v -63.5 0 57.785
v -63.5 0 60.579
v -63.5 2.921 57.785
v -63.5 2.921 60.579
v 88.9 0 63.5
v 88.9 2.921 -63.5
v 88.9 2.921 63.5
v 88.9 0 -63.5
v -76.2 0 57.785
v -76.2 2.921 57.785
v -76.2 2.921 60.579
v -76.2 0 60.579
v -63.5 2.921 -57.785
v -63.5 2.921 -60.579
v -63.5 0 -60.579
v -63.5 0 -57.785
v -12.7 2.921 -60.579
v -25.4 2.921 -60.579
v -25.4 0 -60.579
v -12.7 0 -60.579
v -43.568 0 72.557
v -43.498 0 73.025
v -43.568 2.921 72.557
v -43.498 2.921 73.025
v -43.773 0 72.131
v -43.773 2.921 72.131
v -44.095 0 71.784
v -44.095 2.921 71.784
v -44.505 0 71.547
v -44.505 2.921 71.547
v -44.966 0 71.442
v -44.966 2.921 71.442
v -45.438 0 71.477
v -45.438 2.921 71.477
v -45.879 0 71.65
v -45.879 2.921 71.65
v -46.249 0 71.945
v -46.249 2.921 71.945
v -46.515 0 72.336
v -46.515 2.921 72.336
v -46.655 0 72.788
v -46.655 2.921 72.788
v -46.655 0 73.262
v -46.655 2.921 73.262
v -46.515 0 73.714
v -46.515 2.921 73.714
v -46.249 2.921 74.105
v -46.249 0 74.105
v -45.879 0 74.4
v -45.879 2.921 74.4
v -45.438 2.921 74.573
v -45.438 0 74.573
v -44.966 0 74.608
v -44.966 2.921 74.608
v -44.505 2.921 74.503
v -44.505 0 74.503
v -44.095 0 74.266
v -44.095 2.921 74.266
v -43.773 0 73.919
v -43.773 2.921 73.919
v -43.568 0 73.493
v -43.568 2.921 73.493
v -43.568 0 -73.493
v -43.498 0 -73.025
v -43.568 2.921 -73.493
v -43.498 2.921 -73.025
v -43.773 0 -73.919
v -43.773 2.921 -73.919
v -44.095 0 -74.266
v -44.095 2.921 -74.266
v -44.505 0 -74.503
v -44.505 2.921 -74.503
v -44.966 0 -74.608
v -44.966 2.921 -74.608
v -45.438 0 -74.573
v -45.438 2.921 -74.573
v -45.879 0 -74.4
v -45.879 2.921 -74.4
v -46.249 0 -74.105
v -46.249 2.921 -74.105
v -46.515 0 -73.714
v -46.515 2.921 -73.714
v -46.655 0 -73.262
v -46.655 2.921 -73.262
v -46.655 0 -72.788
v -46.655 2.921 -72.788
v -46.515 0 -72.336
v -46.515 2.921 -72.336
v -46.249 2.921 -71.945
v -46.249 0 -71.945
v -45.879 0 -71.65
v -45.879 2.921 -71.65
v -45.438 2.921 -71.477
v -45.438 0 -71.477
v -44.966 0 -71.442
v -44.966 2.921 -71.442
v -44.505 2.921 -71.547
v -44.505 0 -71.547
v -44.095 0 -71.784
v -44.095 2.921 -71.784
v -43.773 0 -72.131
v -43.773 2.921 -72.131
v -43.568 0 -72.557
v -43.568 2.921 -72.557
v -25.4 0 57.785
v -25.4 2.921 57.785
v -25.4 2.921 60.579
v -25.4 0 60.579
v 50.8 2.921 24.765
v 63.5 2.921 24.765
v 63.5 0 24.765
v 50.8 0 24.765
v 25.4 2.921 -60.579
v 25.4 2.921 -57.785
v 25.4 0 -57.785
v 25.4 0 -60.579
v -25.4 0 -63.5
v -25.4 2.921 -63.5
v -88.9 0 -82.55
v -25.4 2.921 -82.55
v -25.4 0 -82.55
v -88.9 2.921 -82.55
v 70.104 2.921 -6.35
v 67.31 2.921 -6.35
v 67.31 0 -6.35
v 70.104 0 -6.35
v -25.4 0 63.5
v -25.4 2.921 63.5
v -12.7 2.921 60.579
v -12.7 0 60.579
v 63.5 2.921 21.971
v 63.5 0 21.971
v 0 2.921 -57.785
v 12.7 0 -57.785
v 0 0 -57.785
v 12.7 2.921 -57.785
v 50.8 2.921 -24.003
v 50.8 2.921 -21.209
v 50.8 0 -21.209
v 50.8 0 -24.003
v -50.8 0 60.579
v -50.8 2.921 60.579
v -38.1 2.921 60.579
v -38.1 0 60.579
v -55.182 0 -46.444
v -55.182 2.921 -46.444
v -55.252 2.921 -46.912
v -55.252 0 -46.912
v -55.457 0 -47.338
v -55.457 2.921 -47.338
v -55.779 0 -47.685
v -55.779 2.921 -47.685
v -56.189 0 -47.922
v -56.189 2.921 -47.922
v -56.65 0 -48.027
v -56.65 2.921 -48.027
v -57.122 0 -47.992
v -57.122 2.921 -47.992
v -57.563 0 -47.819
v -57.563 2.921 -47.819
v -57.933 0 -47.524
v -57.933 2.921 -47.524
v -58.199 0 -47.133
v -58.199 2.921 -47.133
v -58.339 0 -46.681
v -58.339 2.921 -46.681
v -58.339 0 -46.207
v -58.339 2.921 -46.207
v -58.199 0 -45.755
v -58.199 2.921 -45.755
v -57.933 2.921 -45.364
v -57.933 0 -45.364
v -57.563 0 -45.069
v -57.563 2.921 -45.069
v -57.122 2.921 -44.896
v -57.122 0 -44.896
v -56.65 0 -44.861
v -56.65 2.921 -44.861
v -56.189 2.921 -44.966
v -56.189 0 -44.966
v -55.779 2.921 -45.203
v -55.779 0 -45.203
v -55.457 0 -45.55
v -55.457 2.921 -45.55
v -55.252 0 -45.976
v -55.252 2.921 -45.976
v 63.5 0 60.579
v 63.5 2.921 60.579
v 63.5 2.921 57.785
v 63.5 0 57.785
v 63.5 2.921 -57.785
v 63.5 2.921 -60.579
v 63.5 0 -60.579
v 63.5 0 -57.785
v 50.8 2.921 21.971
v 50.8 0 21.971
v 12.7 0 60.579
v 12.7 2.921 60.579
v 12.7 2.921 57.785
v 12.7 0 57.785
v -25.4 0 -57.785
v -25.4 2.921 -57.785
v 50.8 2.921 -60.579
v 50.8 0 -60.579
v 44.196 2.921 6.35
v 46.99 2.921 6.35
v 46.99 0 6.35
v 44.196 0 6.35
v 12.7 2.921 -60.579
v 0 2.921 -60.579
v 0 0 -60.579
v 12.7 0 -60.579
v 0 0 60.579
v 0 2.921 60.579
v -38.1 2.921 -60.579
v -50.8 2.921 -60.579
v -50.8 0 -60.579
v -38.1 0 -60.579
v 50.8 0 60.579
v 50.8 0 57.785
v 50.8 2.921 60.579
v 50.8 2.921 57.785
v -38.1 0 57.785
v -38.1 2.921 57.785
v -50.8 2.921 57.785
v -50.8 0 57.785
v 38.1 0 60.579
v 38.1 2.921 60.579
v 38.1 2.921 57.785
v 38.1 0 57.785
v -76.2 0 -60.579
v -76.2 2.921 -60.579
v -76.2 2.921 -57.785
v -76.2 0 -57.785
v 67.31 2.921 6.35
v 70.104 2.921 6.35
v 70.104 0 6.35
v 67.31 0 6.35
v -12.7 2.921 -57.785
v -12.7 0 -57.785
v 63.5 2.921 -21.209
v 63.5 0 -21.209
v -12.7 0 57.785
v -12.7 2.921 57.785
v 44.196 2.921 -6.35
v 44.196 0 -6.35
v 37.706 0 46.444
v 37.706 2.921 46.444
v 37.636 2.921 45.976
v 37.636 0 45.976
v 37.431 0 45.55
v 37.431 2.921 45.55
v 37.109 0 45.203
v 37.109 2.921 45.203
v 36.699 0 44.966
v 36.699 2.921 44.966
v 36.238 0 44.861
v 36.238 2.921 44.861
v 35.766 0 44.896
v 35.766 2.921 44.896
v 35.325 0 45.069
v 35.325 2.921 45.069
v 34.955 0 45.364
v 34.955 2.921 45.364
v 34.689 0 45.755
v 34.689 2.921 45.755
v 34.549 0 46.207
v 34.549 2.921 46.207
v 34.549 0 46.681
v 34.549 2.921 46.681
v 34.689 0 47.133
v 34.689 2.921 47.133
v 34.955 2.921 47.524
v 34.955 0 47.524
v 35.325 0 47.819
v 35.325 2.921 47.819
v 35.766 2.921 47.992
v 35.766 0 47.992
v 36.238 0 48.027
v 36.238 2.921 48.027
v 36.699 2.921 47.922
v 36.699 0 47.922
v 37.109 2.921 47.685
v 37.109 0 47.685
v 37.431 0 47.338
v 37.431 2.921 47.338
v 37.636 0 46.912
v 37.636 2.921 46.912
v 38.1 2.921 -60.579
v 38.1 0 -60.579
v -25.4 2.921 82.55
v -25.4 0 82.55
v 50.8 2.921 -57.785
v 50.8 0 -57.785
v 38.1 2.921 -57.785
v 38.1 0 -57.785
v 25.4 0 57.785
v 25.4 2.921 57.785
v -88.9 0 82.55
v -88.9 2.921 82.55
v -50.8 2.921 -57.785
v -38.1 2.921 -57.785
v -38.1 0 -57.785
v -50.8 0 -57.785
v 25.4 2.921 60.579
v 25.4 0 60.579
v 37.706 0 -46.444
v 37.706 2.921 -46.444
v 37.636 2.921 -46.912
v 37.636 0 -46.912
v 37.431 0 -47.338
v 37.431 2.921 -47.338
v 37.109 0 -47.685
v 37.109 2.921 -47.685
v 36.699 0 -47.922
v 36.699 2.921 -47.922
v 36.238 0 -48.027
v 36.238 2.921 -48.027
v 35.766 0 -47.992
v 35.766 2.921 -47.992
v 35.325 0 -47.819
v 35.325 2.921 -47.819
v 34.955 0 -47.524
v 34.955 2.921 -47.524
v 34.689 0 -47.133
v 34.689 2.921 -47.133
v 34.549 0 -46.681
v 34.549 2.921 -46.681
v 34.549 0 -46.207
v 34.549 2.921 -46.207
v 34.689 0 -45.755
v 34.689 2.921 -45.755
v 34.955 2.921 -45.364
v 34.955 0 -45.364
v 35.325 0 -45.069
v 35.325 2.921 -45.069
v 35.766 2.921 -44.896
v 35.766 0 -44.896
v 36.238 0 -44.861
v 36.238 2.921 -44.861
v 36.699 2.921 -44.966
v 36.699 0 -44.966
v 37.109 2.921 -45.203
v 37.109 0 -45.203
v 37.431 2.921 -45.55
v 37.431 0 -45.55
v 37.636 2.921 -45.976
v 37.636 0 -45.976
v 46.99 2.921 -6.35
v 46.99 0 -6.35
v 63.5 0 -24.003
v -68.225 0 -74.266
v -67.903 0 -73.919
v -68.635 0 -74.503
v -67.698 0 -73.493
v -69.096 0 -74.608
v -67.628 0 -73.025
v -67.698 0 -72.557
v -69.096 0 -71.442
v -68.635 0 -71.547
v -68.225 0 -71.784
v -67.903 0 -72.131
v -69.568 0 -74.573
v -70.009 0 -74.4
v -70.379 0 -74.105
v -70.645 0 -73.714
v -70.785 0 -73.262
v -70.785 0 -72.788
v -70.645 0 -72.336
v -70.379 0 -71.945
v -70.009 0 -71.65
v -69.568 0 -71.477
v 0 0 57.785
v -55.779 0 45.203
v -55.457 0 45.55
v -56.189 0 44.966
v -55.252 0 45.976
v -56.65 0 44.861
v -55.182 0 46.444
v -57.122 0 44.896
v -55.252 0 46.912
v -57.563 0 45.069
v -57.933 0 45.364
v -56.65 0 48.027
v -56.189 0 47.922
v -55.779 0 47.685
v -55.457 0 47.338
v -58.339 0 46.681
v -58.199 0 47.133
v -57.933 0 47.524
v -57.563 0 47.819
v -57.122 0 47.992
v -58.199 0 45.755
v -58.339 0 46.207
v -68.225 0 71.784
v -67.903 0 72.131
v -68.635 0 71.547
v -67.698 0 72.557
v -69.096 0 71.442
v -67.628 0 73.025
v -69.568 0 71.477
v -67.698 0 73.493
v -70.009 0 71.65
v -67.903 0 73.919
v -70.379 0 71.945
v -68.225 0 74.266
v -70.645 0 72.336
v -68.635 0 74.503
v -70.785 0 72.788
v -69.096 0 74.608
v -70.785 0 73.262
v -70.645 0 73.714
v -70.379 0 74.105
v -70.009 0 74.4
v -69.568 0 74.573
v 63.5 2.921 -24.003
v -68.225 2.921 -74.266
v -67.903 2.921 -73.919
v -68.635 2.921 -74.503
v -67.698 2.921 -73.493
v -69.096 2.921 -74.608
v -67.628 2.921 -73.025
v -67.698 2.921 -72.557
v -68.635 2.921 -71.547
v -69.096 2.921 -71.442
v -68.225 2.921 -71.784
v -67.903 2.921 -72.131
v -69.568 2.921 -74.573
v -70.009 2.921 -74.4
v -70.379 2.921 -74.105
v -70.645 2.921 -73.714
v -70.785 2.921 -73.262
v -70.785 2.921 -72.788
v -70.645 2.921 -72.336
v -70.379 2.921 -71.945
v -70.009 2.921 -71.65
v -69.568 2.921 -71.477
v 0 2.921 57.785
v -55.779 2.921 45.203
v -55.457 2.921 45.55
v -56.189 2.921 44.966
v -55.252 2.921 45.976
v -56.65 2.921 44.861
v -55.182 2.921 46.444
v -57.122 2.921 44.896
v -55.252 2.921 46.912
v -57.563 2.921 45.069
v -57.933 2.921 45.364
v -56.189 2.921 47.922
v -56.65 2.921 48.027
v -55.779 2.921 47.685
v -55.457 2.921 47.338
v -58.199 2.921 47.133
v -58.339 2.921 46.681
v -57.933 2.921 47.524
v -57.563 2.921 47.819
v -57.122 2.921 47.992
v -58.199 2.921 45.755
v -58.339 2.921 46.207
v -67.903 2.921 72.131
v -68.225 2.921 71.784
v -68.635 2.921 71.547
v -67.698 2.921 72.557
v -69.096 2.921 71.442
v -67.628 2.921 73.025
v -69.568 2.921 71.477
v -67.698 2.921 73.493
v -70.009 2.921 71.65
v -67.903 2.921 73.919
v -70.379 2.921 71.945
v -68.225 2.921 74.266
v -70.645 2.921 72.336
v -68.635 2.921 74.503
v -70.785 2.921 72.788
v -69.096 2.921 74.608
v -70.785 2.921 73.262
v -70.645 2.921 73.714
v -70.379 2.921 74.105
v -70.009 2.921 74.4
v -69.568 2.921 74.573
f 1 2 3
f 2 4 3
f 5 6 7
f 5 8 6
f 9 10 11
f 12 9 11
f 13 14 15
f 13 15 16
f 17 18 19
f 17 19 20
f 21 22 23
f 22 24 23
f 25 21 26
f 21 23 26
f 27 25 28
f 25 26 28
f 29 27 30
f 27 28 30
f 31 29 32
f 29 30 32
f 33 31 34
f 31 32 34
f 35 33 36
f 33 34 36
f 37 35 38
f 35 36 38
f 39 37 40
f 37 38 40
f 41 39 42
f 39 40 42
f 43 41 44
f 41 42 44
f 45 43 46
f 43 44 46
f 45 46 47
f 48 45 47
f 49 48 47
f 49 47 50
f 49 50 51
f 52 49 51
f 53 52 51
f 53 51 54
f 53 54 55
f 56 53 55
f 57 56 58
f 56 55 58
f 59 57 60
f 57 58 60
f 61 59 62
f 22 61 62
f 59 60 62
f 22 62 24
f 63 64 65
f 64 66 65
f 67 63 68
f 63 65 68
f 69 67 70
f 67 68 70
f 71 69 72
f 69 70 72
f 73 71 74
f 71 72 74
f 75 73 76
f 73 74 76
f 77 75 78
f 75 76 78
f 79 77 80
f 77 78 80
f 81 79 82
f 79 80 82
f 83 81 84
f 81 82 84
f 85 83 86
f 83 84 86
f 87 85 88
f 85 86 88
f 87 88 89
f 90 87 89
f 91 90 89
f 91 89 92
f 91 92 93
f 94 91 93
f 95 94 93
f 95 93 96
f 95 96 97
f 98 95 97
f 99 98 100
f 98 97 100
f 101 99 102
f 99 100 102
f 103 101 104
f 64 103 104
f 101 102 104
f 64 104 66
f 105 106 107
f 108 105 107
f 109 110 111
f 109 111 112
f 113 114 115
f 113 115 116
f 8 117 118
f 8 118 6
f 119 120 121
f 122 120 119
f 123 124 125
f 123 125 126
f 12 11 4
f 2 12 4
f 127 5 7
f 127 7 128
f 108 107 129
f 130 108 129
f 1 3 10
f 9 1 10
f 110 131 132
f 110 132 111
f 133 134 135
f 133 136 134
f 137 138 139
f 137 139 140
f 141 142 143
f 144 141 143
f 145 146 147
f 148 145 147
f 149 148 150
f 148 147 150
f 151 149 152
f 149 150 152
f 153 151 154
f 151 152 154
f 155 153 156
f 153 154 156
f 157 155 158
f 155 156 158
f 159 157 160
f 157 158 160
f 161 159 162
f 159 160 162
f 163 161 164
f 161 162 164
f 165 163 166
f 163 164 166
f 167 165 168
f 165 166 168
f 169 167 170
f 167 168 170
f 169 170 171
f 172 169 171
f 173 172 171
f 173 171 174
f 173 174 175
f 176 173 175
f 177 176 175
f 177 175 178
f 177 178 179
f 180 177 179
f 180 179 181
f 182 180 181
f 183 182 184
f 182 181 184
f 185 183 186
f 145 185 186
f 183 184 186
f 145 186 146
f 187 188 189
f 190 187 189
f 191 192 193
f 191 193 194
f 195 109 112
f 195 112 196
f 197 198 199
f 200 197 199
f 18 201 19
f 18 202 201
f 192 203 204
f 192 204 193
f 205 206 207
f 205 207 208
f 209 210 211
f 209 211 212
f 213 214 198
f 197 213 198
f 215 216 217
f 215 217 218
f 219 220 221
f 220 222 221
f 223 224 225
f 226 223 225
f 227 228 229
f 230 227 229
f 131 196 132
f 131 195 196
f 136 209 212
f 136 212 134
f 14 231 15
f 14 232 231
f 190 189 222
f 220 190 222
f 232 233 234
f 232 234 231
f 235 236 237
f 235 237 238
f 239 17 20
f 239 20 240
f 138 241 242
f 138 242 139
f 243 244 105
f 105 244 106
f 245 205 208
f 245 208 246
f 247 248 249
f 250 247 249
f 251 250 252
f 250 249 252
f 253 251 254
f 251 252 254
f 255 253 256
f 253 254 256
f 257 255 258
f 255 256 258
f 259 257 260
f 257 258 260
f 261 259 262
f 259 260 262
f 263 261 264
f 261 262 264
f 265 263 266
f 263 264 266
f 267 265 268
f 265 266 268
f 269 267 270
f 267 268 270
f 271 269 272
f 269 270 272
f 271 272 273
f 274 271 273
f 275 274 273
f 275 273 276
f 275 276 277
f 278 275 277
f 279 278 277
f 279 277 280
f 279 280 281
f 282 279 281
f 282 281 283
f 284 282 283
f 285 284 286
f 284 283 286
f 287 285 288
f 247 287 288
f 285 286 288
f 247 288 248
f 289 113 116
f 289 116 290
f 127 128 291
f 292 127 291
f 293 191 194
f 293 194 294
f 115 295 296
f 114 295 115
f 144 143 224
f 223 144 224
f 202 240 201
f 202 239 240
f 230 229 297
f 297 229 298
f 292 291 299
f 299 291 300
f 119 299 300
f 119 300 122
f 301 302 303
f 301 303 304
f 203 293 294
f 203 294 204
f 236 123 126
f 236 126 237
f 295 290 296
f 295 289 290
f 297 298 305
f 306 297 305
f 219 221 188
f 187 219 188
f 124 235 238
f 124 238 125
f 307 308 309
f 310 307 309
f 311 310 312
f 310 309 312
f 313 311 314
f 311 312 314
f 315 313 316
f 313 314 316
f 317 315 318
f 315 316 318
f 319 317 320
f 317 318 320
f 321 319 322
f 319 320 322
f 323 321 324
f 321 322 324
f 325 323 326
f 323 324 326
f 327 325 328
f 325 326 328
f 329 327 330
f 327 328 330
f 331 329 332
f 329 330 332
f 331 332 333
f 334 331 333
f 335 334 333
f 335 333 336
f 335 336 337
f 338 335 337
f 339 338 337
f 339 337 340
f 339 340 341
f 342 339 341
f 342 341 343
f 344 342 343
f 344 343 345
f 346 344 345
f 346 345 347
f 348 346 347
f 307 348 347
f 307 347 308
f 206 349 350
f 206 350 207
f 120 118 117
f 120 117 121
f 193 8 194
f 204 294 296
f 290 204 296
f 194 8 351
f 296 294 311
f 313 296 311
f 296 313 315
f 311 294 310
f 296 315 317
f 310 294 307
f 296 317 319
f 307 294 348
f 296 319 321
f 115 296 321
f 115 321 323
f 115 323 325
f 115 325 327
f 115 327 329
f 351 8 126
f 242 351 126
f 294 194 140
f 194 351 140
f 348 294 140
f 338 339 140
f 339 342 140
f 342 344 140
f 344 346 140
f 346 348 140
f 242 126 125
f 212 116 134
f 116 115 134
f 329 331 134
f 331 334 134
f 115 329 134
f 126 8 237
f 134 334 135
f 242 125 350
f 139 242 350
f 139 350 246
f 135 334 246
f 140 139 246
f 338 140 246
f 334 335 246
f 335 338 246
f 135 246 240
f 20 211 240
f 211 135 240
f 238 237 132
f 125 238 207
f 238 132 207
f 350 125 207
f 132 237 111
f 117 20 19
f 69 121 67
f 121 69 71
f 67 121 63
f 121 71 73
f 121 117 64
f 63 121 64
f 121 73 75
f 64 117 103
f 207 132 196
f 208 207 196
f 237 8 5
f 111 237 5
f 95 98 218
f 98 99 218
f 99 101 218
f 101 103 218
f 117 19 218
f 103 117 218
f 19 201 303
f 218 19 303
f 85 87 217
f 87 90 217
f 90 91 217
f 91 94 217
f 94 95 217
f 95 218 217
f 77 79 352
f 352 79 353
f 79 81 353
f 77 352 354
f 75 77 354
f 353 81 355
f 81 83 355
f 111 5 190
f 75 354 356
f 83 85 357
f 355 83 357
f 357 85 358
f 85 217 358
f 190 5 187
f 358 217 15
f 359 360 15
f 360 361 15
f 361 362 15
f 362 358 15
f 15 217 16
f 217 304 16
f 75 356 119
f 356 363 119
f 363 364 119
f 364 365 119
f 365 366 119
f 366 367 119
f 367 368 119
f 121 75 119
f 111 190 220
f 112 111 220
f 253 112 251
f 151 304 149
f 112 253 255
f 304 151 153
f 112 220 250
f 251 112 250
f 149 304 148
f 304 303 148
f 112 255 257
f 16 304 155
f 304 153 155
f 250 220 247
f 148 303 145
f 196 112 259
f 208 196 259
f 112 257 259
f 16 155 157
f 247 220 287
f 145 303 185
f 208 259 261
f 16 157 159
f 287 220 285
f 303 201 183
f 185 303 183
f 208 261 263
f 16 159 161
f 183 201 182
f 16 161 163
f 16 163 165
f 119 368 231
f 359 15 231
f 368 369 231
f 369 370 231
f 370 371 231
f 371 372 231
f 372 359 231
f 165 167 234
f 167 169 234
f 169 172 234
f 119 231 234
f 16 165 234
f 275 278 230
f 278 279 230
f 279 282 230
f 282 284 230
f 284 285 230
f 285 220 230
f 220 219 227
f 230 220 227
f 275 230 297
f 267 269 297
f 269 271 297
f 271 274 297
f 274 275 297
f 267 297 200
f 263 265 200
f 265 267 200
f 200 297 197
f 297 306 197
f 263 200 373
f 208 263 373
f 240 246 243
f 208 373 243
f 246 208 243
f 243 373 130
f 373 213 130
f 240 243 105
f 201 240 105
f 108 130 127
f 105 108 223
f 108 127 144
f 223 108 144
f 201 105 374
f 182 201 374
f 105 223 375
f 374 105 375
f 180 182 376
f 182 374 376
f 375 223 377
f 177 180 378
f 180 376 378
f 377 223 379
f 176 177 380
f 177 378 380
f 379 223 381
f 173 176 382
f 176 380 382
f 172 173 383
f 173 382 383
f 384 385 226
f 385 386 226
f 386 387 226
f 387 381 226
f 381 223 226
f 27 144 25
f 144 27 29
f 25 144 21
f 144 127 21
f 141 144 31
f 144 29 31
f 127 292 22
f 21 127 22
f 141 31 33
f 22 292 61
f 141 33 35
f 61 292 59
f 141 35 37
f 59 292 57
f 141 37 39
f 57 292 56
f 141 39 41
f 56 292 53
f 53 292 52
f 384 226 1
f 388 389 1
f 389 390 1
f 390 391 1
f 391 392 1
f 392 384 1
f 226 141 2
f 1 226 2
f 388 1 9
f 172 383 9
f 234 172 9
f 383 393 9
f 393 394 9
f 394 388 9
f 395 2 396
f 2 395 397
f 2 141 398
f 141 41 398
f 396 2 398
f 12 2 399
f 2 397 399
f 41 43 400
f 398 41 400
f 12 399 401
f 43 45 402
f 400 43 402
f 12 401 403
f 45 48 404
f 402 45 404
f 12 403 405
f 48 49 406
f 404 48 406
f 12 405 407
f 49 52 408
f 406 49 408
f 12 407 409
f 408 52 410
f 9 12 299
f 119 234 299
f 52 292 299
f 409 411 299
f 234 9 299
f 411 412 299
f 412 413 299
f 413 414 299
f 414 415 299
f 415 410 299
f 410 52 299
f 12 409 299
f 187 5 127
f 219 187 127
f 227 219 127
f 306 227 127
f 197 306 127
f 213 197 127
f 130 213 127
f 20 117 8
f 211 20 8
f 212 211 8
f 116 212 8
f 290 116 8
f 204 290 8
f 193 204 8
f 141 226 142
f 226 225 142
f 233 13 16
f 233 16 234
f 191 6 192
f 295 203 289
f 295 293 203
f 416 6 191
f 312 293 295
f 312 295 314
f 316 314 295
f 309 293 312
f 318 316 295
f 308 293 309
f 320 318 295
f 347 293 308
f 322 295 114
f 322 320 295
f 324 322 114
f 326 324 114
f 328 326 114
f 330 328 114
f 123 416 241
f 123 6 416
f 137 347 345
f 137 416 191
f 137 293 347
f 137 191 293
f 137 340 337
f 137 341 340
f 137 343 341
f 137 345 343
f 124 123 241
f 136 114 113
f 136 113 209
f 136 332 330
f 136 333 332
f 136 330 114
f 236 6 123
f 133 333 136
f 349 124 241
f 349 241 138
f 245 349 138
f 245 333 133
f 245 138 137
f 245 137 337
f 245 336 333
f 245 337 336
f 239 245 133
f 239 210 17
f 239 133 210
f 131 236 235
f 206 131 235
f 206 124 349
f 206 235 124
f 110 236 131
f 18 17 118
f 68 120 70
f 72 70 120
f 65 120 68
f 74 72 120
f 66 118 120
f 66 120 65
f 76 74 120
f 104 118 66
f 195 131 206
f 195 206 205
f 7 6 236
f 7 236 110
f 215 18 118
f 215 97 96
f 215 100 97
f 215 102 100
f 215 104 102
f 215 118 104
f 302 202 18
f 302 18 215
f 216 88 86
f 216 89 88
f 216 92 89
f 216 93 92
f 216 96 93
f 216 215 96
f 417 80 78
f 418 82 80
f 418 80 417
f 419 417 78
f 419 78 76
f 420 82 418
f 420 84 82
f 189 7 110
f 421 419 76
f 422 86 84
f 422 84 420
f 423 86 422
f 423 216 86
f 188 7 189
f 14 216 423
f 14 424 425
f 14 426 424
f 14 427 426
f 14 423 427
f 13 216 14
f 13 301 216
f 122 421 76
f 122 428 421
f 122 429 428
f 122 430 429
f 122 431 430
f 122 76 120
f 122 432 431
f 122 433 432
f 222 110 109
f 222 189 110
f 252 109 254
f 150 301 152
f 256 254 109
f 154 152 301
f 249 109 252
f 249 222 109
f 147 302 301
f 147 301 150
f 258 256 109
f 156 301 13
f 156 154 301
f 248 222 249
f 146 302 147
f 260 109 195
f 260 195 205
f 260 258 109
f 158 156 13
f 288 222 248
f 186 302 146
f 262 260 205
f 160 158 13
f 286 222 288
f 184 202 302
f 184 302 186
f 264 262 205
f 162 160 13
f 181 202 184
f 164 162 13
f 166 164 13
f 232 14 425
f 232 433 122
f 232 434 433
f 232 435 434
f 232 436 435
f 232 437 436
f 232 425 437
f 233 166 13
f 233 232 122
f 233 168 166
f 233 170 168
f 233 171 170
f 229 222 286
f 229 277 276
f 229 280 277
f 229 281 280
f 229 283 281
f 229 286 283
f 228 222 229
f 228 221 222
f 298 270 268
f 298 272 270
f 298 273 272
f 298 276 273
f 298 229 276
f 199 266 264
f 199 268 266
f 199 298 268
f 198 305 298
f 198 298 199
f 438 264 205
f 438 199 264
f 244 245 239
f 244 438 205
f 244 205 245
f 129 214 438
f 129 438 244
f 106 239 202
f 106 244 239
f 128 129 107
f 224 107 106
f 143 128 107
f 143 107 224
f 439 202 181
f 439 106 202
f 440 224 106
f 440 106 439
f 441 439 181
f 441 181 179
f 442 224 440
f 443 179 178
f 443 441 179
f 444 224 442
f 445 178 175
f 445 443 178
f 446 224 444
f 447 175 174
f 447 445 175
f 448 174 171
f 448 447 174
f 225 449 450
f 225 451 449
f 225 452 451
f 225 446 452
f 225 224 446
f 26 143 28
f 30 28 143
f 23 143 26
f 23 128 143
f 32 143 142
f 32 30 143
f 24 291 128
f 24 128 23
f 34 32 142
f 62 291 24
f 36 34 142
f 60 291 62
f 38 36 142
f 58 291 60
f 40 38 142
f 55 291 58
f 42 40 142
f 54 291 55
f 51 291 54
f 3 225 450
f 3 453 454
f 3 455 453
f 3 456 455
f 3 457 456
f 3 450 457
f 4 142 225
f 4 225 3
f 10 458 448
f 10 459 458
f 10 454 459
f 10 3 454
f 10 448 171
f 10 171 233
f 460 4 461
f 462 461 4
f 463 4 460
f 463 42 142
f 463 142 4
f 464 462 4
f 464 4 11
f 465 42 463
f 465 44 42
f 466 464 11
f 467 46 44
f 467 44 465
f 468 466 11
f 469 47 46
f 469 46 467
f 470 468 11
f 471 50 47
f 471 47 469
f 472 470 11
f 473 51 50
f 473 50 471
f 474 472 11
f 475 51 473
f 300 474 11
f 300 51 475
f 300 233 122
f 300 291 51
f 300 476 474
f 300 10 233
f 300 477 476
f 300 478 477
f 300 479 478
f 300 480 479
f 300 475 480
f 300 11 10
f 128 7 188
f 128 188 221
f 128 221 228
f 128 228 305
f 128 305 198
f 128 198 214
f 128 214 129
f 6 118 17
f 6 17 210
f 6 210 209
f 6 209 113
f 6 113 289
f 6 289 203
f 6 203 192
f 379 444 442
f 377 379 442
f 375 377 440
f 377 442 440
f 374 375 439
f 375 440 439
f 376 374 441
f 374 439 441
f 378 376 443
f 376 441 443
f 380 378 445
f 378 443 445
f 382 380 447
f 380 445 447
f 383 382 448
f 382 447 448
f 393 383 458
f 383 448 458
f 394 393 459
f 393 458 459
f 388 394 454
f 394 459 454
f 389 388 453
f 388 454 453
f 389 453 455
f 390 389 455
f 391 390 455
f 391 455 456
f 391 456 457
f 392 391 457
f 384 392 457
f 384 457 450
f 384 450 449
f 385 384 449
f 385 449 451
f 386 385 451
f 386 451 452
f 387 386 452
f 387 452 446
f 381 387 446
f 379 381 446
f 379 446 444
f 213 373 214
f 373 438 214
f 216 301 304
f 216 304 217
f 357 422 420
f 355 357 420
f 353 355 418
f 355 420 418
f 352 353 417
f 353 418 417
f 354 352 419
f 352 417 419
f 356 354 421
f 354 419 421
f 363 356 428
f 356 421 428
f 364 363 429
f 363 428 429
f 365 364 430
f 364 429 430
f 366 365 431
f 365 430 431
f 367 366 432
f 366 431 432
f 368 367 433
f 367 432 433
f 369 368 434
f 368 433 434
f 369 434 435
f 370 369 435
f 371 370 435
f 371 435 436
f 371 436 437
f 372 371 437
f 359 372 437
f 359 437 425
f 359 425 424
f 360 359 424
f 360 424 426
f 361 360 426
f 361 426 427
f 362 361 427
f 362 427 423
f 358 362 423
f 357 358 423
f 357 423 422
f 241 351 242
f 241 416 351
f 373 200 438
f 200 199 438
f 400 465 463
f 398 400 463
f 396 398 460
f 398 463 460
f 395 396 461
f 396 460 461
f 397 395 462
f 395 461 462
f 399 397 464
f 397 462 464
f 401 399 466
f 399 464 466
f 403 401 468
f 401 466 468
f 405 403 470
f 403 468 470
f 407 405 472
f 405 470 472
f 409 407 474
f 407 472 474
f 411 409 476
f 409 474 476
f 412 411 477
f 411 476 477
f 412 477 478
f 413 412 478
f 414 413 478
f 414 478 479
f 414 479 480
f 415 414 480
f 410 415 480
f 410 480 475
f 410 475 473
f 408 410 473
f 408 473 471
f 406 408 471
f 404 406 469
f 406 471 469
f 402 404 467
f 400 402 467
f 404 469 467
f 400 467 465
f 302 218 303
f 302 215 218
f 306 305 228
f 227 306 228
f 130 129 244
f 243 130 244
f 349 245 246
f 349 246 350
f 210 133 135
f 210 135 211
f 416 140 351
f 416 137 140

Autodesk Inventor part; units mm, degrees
ref_plane "YZ Plane" through (0, 0, 0) normal (1, 0, 0) x (0, 1, 0)
ref_plane "XZ Plane" through (0, 0, 0) normal (0, 1, 0) x (-1, 0, 0)
ref_plane "XY Plane" through (0, 0, 0) normal (0, 0, 1) x (1, 0, 0)
sketch "Sketch1" plane through (0, 0, 0) normal (0, 1, 0) x (-1, 0, 0)
  line L0 (-88.9, 63.5) -> (88.9, 63.5)
  line L1 (88.9, 63.5) -> (88.9, -63.5)
  line L2 (88.9, -63.5) -> (-88.9, -63.5)
  line L3 (-88.9, -63.5) -> (-88.9, 63.5)
  line L4 (-88.9, 63.5) -> (88.9, -63.5) construction
  line L5 (88.9, 63.5) -> (-88.9, -63.5) construction
  point P0 (0, 0)
  dimension "d0" = 127
  dimension "d1" = 177.8
extrude "Extrusion1" add sketch "Sketch1" along normal blind 2.921
sketch "Sketch2" plane through (0, 2.921, 0) normal (0, 1, 0) x (1, 0, 0)
  line L0 (-60.325, -50) -> (39.675, -50) construction
  line L1 (39.675, -50) -> (39.675, 50) construction
  line L2 (39.675, 50) -> (-60.325, 50) construction
  line L3 (-60.325, 50) -> (-60.325, -50) construction
  circle A0 centre (36.119, -46.444) radius 1.5875
  circle A1 centre (-56.769, -46.444) radius 1.5875
  circle A2 centre (-56.769, 46.444) radius 1.5875
  circle A3 centre (36.119, 46.444) radius 1.5875
  point P0 (0, 0)
  dimension "d8" = 100
  dimension "d9" = 100
  dimension "d10" = 50
  dimension "d11" = 60.325
  dimension "d12" = 3.175
  dimension "d13" = 3.175
  dimension "d14" = 3.175
  dimension "d15" = 3.175
  dimension "d16" = 3.556
  dimension "d17" = 3.556
  dimension "d18" = 3.556
  dimension "d19" = 3.556
  dimension "d20" = 3.556
  dimension "d21" = 3.556
  dimension "d22" = 3.556
  dimension "d23" = 3.556
extrude "Extrusion2" cut sketch "Sketch2" against normal blind 25.4
sketch "Sketch4" plane through (0, 2.921, 0) normal (0, 1, 0) x (1, 0, 0)
  line L0 (-76.2, -60.579) -> (-63.5, -60.579)
  line L1 (-63.5, -60.579) -> (-63.5, -57.785)
  line L2 (-63.5, -57.785) -> (-76.2, -57.785)
  line L3 (-76.2, -57.785) -> (-76.2, -60.579)
  line L4 (-76.2, 60.579) -> (-63.5, 60.579)
  line L5 (-63.5, 60.579) -> (-63.5, 57.785)
  line L6 (-63.5, 57.785) -> (-76.2, 57.785)
  line L7 (-76.2, 57.785) -> (-76.2, 60.579)
  line L8 (-88.9, -63.5) -> (88.9, -63.5) projected
  line L9 (-88.9, 63.5) -> (-88.9, -63.5) projected
  line L10 (88.9, 63.5) -> (-88.9, 63.5) projected
  line L11 (-50.8, -60.579) -> (-38.1, -60.579)
  line L12 (-38.1, -60.579) -> (-38.1, -57.785)
  line L13 (-38.1, -57.785) -> (-50.8, -57.785)
  line L14 (-50.8, -57.785) -> (-50.8, -60.579)
  line L15 (-50.8, 60.579) -> (-38.1, 60.579)
  line L16 (-38.1, 60.579) -> (-38.1, 57.785)
  line L17 (-38.1, 57.785) -> (-50.8, 57.785)
  line L18 (-50.8, 57.785) -> (-50.8, 60.579)
  line L19 (-25.4, -60.579) -> (-12.7, -60.579)
  line L20 (-12.7, -60.579) -> (-12.7, -57.785)
  line L21 (-12.7, -57.785) -> (-25.4, -57.785)
  line L22 (-25.4, -57.785) -> (-25.4, -60.579)
  line L23 (-25.4, 60.579) -> (-12.7, 60.579)
  line L24 (-12.7, 60.579) -> (-12.7, 57.785)
  line L25 (-12.7, 57.785) -> (-25.4, 57.785)
  line L26 (-25.4, 57.785) -> (-25.4, 60.579)
  line L27 (0, -60.579) -> (12.7, -60.579)
  line L28 (12.7, -60.579) -> (12.7, -57.785)
  line L29 (12.7, -57.785) -> (0, -57.785)
  line L30 (0, -57.785) -> (0, -60.579)
  line L31 (0, 60.579) -> (12.7, 60.579)
  line L32 (12.7, 60.579) -> (12.7, 57.785)
  line L33 (12.7, 57.785) -> (0, 57.785)
  line L34 (0, 57.785) -> (0, 60.579)
  line L35 (25.4, -60.579) -> (38.1, -60.579)
  line L36 (38.1, -60.579) -> (38.1, -57.785)
  line L37 (38.1, -57.785) -> (25.4, -57.785)
  line L38 (25.4, -57.785) -> (25.4, -60.579)
  line L39 (25.4, 60.579) -> (38.1, 60.579)
  line L40 (38.1, 60.579) -> (38.1, 57.785)
  line L41 (38.1, 57.785) -> (25.4, 57.785)
  line L42 (25.4, 57.785) -> (25.4, 60.579)
  line L43 (50.8, -60.579) -> (63.5, -60.579)
  line L44 (63.5, -60.579) -> (63.5, -57.785)
  line L45 (63.5, -57.785) -> (50.8, -57.785)
  line L46 (50.8, -57.785) -> (50.8, -60.579)
  line L47 (50.8, 60.579) -> (63.5, 60.579)
  line L48 (63.5, 60.579) -> (63.5, 57.785)
  line L49 (63.5, 57.785) -> (50.8, 57.785)
  line L50 (50.8, 57.785) -> (50.8, 60.579)
  point P0 (0, 0)
  point P1 (0, -57.15)
  point P2 (0, 57.15)
  dimension "d26" = 2.794
  dimension "d27" = 2.794
  dimension "d28" = 2.921
  dimension "d29" = 12.7
  dimension "d30" = 12.7
  dimension "d31" = 12.7
  dimension "d32" = 2.921
  dimension "d33" = 12.7
  dimension "d36" = 25.4
extrude "Extrusion3" cut sketch "Sketch4" against normal blind 25.4
sketch "Sketch5" plane through (0, 2.921, 0) normal (0, 1, 0) x (1, 0, 0)
  line L0 (-88.9, 63.5) -> (-25.4, 63.5)
  line L1 (-25.4, 63.5) -> (-25.4, 82.55)
  line L2 (-25.4, 82.55) -> (-88.9, 82.55)
  line L3 (-88.9, 82.55) -> (-88.9, 63.5)
  line L4 (-88.9, -63.5) -> (88.9, -63.5) projected
  line L5 (-88.9, -63.5) -> (-25.4, -63.5)
  line L6 (-25.4, -63.5) -> (-25.4, -82.55)
  line L7 (-25.4, -82.55) -> (-88.9, -82.55)
  line L8 (-88.9, -82.55) -> (-88.9, -63.5)
  line L9 (88.9, 63.5) -> (-88.9, 63.5) projected
  line L10 (-88.9, 63.5) -> (-88.9, -63.5) projected
  point P0 (0, 0)
  point P1 (0, -57.15)
  point P2 (0, 57.15)
  point P3 (88.9, -63.5)
  dimension "d43" = 63.5
  dimension "d44" = 19.05
  dimension "d45" = 63.5
  dimension "d46" = 19.05
  dimension "d47" = 0
  dimension "d64" = 0
extrude "Extrusion4" add sketch "Sketch5" against normal blind 2.921
sketch "Sketch6" plane through (0, 2.921, 0) normal (0, 1, 0) x (1, 0, 0)
  circle A0 centre (-69.215, 73.025) radius 1.5875
  circle A1 centre (-69.215, -73.025) radius 1.5875
  circle A2 centre (-45.085, -73.025) radius 1.5875
  circle A3 centre (-45.085, 73.025) radius 1.5875
  line L0 (-25.4, 82.55) -> (-88.9, 82.55) projected
  line L1 (-25.4, -82.55) -> (-88.9, -82.55) projected
  line L2 (-88.9, 82.55) -> (-88.9, -82.55) projected
  point P0 (0, 0)
  dimension "d50" = 3.175
  dimension "d51" = 9.525
  dimension "d52" = 9.525
  dimension "d53" = 24.13
  dimension "d54" = 24.13
  dimension "d55" = 9.525
  dimension "d56" = 9.525
  dimension "d57" = 3.175
  dimension "d58" = 3.175
  dimension "d59" = 3.175
  dimension "d61" = 19.685
  dimension "d65" = 19.685
extrude "Extrusion5" cut sketch "Sketch6" against normal blind 2.921
sketch "Sketch7" plane through (0, 2.921, 0) normal (0, 1, 0) x (1, 0, 0)
  line L0 (50.8, 24.003) -> (63.5, 24.003)
  line L1 (63.5, 24.003) -> (63.5, 21.209)
  line L2 (63.5, 21.209) -> (50.8, 21.209)
  line L3 (50.8, 21.209) -> (50.8, 24.003)
  line L4 (50.8, -21.971) -> (63.5, -21.971)
  line L5 (63.5, -21.971) -> (63.5, -24.765)
  line L6 (63.5, -24.765) -> (50.8, -24.765)
  line L7 (50.8, -24.765) -> (50.8, -21.971)
  line L8 (44.196, 6.35) -> (46.99, 6.35)
  line L9 (46.99, 6.35) -> (46.99, -6.35)
  line L10 (46.99, -6.35) -> (44.196, -6.35)
  line L11 (44.196, -6.35) -> (44.196, 6.35)
  line L12 (67.31, 6.35) -> (70.104, 6.35)
  line L13 (70.104, 6.35) -> (70.104, -6.35)
  line L14 (70.104, -6.35) -> (67.31, -6.35)
  line L15 (67.31, -6.35) -> (67.31, 6.35)
  point P0 (0, 0)
  dimension "d66" = 43.18
  dimension "d67" = 12.7
  dimension "d68" = 21.209
  dimension "d69" = 2.794
  dimension "d70" = 2.794
  dimension "d71" = 50.8
  dimension "d72" = 12.7
  dimension "d73" = 6.35
  dimension "d74" = 20.32
  dimension "d75" = 2.794
  dimension "d76" = 2.794
  dimension "d77" = 3.81
extrude "Extrusion6" cut sketch "Sketch7" against normal blind 2.921
properties part number "Chassis"
